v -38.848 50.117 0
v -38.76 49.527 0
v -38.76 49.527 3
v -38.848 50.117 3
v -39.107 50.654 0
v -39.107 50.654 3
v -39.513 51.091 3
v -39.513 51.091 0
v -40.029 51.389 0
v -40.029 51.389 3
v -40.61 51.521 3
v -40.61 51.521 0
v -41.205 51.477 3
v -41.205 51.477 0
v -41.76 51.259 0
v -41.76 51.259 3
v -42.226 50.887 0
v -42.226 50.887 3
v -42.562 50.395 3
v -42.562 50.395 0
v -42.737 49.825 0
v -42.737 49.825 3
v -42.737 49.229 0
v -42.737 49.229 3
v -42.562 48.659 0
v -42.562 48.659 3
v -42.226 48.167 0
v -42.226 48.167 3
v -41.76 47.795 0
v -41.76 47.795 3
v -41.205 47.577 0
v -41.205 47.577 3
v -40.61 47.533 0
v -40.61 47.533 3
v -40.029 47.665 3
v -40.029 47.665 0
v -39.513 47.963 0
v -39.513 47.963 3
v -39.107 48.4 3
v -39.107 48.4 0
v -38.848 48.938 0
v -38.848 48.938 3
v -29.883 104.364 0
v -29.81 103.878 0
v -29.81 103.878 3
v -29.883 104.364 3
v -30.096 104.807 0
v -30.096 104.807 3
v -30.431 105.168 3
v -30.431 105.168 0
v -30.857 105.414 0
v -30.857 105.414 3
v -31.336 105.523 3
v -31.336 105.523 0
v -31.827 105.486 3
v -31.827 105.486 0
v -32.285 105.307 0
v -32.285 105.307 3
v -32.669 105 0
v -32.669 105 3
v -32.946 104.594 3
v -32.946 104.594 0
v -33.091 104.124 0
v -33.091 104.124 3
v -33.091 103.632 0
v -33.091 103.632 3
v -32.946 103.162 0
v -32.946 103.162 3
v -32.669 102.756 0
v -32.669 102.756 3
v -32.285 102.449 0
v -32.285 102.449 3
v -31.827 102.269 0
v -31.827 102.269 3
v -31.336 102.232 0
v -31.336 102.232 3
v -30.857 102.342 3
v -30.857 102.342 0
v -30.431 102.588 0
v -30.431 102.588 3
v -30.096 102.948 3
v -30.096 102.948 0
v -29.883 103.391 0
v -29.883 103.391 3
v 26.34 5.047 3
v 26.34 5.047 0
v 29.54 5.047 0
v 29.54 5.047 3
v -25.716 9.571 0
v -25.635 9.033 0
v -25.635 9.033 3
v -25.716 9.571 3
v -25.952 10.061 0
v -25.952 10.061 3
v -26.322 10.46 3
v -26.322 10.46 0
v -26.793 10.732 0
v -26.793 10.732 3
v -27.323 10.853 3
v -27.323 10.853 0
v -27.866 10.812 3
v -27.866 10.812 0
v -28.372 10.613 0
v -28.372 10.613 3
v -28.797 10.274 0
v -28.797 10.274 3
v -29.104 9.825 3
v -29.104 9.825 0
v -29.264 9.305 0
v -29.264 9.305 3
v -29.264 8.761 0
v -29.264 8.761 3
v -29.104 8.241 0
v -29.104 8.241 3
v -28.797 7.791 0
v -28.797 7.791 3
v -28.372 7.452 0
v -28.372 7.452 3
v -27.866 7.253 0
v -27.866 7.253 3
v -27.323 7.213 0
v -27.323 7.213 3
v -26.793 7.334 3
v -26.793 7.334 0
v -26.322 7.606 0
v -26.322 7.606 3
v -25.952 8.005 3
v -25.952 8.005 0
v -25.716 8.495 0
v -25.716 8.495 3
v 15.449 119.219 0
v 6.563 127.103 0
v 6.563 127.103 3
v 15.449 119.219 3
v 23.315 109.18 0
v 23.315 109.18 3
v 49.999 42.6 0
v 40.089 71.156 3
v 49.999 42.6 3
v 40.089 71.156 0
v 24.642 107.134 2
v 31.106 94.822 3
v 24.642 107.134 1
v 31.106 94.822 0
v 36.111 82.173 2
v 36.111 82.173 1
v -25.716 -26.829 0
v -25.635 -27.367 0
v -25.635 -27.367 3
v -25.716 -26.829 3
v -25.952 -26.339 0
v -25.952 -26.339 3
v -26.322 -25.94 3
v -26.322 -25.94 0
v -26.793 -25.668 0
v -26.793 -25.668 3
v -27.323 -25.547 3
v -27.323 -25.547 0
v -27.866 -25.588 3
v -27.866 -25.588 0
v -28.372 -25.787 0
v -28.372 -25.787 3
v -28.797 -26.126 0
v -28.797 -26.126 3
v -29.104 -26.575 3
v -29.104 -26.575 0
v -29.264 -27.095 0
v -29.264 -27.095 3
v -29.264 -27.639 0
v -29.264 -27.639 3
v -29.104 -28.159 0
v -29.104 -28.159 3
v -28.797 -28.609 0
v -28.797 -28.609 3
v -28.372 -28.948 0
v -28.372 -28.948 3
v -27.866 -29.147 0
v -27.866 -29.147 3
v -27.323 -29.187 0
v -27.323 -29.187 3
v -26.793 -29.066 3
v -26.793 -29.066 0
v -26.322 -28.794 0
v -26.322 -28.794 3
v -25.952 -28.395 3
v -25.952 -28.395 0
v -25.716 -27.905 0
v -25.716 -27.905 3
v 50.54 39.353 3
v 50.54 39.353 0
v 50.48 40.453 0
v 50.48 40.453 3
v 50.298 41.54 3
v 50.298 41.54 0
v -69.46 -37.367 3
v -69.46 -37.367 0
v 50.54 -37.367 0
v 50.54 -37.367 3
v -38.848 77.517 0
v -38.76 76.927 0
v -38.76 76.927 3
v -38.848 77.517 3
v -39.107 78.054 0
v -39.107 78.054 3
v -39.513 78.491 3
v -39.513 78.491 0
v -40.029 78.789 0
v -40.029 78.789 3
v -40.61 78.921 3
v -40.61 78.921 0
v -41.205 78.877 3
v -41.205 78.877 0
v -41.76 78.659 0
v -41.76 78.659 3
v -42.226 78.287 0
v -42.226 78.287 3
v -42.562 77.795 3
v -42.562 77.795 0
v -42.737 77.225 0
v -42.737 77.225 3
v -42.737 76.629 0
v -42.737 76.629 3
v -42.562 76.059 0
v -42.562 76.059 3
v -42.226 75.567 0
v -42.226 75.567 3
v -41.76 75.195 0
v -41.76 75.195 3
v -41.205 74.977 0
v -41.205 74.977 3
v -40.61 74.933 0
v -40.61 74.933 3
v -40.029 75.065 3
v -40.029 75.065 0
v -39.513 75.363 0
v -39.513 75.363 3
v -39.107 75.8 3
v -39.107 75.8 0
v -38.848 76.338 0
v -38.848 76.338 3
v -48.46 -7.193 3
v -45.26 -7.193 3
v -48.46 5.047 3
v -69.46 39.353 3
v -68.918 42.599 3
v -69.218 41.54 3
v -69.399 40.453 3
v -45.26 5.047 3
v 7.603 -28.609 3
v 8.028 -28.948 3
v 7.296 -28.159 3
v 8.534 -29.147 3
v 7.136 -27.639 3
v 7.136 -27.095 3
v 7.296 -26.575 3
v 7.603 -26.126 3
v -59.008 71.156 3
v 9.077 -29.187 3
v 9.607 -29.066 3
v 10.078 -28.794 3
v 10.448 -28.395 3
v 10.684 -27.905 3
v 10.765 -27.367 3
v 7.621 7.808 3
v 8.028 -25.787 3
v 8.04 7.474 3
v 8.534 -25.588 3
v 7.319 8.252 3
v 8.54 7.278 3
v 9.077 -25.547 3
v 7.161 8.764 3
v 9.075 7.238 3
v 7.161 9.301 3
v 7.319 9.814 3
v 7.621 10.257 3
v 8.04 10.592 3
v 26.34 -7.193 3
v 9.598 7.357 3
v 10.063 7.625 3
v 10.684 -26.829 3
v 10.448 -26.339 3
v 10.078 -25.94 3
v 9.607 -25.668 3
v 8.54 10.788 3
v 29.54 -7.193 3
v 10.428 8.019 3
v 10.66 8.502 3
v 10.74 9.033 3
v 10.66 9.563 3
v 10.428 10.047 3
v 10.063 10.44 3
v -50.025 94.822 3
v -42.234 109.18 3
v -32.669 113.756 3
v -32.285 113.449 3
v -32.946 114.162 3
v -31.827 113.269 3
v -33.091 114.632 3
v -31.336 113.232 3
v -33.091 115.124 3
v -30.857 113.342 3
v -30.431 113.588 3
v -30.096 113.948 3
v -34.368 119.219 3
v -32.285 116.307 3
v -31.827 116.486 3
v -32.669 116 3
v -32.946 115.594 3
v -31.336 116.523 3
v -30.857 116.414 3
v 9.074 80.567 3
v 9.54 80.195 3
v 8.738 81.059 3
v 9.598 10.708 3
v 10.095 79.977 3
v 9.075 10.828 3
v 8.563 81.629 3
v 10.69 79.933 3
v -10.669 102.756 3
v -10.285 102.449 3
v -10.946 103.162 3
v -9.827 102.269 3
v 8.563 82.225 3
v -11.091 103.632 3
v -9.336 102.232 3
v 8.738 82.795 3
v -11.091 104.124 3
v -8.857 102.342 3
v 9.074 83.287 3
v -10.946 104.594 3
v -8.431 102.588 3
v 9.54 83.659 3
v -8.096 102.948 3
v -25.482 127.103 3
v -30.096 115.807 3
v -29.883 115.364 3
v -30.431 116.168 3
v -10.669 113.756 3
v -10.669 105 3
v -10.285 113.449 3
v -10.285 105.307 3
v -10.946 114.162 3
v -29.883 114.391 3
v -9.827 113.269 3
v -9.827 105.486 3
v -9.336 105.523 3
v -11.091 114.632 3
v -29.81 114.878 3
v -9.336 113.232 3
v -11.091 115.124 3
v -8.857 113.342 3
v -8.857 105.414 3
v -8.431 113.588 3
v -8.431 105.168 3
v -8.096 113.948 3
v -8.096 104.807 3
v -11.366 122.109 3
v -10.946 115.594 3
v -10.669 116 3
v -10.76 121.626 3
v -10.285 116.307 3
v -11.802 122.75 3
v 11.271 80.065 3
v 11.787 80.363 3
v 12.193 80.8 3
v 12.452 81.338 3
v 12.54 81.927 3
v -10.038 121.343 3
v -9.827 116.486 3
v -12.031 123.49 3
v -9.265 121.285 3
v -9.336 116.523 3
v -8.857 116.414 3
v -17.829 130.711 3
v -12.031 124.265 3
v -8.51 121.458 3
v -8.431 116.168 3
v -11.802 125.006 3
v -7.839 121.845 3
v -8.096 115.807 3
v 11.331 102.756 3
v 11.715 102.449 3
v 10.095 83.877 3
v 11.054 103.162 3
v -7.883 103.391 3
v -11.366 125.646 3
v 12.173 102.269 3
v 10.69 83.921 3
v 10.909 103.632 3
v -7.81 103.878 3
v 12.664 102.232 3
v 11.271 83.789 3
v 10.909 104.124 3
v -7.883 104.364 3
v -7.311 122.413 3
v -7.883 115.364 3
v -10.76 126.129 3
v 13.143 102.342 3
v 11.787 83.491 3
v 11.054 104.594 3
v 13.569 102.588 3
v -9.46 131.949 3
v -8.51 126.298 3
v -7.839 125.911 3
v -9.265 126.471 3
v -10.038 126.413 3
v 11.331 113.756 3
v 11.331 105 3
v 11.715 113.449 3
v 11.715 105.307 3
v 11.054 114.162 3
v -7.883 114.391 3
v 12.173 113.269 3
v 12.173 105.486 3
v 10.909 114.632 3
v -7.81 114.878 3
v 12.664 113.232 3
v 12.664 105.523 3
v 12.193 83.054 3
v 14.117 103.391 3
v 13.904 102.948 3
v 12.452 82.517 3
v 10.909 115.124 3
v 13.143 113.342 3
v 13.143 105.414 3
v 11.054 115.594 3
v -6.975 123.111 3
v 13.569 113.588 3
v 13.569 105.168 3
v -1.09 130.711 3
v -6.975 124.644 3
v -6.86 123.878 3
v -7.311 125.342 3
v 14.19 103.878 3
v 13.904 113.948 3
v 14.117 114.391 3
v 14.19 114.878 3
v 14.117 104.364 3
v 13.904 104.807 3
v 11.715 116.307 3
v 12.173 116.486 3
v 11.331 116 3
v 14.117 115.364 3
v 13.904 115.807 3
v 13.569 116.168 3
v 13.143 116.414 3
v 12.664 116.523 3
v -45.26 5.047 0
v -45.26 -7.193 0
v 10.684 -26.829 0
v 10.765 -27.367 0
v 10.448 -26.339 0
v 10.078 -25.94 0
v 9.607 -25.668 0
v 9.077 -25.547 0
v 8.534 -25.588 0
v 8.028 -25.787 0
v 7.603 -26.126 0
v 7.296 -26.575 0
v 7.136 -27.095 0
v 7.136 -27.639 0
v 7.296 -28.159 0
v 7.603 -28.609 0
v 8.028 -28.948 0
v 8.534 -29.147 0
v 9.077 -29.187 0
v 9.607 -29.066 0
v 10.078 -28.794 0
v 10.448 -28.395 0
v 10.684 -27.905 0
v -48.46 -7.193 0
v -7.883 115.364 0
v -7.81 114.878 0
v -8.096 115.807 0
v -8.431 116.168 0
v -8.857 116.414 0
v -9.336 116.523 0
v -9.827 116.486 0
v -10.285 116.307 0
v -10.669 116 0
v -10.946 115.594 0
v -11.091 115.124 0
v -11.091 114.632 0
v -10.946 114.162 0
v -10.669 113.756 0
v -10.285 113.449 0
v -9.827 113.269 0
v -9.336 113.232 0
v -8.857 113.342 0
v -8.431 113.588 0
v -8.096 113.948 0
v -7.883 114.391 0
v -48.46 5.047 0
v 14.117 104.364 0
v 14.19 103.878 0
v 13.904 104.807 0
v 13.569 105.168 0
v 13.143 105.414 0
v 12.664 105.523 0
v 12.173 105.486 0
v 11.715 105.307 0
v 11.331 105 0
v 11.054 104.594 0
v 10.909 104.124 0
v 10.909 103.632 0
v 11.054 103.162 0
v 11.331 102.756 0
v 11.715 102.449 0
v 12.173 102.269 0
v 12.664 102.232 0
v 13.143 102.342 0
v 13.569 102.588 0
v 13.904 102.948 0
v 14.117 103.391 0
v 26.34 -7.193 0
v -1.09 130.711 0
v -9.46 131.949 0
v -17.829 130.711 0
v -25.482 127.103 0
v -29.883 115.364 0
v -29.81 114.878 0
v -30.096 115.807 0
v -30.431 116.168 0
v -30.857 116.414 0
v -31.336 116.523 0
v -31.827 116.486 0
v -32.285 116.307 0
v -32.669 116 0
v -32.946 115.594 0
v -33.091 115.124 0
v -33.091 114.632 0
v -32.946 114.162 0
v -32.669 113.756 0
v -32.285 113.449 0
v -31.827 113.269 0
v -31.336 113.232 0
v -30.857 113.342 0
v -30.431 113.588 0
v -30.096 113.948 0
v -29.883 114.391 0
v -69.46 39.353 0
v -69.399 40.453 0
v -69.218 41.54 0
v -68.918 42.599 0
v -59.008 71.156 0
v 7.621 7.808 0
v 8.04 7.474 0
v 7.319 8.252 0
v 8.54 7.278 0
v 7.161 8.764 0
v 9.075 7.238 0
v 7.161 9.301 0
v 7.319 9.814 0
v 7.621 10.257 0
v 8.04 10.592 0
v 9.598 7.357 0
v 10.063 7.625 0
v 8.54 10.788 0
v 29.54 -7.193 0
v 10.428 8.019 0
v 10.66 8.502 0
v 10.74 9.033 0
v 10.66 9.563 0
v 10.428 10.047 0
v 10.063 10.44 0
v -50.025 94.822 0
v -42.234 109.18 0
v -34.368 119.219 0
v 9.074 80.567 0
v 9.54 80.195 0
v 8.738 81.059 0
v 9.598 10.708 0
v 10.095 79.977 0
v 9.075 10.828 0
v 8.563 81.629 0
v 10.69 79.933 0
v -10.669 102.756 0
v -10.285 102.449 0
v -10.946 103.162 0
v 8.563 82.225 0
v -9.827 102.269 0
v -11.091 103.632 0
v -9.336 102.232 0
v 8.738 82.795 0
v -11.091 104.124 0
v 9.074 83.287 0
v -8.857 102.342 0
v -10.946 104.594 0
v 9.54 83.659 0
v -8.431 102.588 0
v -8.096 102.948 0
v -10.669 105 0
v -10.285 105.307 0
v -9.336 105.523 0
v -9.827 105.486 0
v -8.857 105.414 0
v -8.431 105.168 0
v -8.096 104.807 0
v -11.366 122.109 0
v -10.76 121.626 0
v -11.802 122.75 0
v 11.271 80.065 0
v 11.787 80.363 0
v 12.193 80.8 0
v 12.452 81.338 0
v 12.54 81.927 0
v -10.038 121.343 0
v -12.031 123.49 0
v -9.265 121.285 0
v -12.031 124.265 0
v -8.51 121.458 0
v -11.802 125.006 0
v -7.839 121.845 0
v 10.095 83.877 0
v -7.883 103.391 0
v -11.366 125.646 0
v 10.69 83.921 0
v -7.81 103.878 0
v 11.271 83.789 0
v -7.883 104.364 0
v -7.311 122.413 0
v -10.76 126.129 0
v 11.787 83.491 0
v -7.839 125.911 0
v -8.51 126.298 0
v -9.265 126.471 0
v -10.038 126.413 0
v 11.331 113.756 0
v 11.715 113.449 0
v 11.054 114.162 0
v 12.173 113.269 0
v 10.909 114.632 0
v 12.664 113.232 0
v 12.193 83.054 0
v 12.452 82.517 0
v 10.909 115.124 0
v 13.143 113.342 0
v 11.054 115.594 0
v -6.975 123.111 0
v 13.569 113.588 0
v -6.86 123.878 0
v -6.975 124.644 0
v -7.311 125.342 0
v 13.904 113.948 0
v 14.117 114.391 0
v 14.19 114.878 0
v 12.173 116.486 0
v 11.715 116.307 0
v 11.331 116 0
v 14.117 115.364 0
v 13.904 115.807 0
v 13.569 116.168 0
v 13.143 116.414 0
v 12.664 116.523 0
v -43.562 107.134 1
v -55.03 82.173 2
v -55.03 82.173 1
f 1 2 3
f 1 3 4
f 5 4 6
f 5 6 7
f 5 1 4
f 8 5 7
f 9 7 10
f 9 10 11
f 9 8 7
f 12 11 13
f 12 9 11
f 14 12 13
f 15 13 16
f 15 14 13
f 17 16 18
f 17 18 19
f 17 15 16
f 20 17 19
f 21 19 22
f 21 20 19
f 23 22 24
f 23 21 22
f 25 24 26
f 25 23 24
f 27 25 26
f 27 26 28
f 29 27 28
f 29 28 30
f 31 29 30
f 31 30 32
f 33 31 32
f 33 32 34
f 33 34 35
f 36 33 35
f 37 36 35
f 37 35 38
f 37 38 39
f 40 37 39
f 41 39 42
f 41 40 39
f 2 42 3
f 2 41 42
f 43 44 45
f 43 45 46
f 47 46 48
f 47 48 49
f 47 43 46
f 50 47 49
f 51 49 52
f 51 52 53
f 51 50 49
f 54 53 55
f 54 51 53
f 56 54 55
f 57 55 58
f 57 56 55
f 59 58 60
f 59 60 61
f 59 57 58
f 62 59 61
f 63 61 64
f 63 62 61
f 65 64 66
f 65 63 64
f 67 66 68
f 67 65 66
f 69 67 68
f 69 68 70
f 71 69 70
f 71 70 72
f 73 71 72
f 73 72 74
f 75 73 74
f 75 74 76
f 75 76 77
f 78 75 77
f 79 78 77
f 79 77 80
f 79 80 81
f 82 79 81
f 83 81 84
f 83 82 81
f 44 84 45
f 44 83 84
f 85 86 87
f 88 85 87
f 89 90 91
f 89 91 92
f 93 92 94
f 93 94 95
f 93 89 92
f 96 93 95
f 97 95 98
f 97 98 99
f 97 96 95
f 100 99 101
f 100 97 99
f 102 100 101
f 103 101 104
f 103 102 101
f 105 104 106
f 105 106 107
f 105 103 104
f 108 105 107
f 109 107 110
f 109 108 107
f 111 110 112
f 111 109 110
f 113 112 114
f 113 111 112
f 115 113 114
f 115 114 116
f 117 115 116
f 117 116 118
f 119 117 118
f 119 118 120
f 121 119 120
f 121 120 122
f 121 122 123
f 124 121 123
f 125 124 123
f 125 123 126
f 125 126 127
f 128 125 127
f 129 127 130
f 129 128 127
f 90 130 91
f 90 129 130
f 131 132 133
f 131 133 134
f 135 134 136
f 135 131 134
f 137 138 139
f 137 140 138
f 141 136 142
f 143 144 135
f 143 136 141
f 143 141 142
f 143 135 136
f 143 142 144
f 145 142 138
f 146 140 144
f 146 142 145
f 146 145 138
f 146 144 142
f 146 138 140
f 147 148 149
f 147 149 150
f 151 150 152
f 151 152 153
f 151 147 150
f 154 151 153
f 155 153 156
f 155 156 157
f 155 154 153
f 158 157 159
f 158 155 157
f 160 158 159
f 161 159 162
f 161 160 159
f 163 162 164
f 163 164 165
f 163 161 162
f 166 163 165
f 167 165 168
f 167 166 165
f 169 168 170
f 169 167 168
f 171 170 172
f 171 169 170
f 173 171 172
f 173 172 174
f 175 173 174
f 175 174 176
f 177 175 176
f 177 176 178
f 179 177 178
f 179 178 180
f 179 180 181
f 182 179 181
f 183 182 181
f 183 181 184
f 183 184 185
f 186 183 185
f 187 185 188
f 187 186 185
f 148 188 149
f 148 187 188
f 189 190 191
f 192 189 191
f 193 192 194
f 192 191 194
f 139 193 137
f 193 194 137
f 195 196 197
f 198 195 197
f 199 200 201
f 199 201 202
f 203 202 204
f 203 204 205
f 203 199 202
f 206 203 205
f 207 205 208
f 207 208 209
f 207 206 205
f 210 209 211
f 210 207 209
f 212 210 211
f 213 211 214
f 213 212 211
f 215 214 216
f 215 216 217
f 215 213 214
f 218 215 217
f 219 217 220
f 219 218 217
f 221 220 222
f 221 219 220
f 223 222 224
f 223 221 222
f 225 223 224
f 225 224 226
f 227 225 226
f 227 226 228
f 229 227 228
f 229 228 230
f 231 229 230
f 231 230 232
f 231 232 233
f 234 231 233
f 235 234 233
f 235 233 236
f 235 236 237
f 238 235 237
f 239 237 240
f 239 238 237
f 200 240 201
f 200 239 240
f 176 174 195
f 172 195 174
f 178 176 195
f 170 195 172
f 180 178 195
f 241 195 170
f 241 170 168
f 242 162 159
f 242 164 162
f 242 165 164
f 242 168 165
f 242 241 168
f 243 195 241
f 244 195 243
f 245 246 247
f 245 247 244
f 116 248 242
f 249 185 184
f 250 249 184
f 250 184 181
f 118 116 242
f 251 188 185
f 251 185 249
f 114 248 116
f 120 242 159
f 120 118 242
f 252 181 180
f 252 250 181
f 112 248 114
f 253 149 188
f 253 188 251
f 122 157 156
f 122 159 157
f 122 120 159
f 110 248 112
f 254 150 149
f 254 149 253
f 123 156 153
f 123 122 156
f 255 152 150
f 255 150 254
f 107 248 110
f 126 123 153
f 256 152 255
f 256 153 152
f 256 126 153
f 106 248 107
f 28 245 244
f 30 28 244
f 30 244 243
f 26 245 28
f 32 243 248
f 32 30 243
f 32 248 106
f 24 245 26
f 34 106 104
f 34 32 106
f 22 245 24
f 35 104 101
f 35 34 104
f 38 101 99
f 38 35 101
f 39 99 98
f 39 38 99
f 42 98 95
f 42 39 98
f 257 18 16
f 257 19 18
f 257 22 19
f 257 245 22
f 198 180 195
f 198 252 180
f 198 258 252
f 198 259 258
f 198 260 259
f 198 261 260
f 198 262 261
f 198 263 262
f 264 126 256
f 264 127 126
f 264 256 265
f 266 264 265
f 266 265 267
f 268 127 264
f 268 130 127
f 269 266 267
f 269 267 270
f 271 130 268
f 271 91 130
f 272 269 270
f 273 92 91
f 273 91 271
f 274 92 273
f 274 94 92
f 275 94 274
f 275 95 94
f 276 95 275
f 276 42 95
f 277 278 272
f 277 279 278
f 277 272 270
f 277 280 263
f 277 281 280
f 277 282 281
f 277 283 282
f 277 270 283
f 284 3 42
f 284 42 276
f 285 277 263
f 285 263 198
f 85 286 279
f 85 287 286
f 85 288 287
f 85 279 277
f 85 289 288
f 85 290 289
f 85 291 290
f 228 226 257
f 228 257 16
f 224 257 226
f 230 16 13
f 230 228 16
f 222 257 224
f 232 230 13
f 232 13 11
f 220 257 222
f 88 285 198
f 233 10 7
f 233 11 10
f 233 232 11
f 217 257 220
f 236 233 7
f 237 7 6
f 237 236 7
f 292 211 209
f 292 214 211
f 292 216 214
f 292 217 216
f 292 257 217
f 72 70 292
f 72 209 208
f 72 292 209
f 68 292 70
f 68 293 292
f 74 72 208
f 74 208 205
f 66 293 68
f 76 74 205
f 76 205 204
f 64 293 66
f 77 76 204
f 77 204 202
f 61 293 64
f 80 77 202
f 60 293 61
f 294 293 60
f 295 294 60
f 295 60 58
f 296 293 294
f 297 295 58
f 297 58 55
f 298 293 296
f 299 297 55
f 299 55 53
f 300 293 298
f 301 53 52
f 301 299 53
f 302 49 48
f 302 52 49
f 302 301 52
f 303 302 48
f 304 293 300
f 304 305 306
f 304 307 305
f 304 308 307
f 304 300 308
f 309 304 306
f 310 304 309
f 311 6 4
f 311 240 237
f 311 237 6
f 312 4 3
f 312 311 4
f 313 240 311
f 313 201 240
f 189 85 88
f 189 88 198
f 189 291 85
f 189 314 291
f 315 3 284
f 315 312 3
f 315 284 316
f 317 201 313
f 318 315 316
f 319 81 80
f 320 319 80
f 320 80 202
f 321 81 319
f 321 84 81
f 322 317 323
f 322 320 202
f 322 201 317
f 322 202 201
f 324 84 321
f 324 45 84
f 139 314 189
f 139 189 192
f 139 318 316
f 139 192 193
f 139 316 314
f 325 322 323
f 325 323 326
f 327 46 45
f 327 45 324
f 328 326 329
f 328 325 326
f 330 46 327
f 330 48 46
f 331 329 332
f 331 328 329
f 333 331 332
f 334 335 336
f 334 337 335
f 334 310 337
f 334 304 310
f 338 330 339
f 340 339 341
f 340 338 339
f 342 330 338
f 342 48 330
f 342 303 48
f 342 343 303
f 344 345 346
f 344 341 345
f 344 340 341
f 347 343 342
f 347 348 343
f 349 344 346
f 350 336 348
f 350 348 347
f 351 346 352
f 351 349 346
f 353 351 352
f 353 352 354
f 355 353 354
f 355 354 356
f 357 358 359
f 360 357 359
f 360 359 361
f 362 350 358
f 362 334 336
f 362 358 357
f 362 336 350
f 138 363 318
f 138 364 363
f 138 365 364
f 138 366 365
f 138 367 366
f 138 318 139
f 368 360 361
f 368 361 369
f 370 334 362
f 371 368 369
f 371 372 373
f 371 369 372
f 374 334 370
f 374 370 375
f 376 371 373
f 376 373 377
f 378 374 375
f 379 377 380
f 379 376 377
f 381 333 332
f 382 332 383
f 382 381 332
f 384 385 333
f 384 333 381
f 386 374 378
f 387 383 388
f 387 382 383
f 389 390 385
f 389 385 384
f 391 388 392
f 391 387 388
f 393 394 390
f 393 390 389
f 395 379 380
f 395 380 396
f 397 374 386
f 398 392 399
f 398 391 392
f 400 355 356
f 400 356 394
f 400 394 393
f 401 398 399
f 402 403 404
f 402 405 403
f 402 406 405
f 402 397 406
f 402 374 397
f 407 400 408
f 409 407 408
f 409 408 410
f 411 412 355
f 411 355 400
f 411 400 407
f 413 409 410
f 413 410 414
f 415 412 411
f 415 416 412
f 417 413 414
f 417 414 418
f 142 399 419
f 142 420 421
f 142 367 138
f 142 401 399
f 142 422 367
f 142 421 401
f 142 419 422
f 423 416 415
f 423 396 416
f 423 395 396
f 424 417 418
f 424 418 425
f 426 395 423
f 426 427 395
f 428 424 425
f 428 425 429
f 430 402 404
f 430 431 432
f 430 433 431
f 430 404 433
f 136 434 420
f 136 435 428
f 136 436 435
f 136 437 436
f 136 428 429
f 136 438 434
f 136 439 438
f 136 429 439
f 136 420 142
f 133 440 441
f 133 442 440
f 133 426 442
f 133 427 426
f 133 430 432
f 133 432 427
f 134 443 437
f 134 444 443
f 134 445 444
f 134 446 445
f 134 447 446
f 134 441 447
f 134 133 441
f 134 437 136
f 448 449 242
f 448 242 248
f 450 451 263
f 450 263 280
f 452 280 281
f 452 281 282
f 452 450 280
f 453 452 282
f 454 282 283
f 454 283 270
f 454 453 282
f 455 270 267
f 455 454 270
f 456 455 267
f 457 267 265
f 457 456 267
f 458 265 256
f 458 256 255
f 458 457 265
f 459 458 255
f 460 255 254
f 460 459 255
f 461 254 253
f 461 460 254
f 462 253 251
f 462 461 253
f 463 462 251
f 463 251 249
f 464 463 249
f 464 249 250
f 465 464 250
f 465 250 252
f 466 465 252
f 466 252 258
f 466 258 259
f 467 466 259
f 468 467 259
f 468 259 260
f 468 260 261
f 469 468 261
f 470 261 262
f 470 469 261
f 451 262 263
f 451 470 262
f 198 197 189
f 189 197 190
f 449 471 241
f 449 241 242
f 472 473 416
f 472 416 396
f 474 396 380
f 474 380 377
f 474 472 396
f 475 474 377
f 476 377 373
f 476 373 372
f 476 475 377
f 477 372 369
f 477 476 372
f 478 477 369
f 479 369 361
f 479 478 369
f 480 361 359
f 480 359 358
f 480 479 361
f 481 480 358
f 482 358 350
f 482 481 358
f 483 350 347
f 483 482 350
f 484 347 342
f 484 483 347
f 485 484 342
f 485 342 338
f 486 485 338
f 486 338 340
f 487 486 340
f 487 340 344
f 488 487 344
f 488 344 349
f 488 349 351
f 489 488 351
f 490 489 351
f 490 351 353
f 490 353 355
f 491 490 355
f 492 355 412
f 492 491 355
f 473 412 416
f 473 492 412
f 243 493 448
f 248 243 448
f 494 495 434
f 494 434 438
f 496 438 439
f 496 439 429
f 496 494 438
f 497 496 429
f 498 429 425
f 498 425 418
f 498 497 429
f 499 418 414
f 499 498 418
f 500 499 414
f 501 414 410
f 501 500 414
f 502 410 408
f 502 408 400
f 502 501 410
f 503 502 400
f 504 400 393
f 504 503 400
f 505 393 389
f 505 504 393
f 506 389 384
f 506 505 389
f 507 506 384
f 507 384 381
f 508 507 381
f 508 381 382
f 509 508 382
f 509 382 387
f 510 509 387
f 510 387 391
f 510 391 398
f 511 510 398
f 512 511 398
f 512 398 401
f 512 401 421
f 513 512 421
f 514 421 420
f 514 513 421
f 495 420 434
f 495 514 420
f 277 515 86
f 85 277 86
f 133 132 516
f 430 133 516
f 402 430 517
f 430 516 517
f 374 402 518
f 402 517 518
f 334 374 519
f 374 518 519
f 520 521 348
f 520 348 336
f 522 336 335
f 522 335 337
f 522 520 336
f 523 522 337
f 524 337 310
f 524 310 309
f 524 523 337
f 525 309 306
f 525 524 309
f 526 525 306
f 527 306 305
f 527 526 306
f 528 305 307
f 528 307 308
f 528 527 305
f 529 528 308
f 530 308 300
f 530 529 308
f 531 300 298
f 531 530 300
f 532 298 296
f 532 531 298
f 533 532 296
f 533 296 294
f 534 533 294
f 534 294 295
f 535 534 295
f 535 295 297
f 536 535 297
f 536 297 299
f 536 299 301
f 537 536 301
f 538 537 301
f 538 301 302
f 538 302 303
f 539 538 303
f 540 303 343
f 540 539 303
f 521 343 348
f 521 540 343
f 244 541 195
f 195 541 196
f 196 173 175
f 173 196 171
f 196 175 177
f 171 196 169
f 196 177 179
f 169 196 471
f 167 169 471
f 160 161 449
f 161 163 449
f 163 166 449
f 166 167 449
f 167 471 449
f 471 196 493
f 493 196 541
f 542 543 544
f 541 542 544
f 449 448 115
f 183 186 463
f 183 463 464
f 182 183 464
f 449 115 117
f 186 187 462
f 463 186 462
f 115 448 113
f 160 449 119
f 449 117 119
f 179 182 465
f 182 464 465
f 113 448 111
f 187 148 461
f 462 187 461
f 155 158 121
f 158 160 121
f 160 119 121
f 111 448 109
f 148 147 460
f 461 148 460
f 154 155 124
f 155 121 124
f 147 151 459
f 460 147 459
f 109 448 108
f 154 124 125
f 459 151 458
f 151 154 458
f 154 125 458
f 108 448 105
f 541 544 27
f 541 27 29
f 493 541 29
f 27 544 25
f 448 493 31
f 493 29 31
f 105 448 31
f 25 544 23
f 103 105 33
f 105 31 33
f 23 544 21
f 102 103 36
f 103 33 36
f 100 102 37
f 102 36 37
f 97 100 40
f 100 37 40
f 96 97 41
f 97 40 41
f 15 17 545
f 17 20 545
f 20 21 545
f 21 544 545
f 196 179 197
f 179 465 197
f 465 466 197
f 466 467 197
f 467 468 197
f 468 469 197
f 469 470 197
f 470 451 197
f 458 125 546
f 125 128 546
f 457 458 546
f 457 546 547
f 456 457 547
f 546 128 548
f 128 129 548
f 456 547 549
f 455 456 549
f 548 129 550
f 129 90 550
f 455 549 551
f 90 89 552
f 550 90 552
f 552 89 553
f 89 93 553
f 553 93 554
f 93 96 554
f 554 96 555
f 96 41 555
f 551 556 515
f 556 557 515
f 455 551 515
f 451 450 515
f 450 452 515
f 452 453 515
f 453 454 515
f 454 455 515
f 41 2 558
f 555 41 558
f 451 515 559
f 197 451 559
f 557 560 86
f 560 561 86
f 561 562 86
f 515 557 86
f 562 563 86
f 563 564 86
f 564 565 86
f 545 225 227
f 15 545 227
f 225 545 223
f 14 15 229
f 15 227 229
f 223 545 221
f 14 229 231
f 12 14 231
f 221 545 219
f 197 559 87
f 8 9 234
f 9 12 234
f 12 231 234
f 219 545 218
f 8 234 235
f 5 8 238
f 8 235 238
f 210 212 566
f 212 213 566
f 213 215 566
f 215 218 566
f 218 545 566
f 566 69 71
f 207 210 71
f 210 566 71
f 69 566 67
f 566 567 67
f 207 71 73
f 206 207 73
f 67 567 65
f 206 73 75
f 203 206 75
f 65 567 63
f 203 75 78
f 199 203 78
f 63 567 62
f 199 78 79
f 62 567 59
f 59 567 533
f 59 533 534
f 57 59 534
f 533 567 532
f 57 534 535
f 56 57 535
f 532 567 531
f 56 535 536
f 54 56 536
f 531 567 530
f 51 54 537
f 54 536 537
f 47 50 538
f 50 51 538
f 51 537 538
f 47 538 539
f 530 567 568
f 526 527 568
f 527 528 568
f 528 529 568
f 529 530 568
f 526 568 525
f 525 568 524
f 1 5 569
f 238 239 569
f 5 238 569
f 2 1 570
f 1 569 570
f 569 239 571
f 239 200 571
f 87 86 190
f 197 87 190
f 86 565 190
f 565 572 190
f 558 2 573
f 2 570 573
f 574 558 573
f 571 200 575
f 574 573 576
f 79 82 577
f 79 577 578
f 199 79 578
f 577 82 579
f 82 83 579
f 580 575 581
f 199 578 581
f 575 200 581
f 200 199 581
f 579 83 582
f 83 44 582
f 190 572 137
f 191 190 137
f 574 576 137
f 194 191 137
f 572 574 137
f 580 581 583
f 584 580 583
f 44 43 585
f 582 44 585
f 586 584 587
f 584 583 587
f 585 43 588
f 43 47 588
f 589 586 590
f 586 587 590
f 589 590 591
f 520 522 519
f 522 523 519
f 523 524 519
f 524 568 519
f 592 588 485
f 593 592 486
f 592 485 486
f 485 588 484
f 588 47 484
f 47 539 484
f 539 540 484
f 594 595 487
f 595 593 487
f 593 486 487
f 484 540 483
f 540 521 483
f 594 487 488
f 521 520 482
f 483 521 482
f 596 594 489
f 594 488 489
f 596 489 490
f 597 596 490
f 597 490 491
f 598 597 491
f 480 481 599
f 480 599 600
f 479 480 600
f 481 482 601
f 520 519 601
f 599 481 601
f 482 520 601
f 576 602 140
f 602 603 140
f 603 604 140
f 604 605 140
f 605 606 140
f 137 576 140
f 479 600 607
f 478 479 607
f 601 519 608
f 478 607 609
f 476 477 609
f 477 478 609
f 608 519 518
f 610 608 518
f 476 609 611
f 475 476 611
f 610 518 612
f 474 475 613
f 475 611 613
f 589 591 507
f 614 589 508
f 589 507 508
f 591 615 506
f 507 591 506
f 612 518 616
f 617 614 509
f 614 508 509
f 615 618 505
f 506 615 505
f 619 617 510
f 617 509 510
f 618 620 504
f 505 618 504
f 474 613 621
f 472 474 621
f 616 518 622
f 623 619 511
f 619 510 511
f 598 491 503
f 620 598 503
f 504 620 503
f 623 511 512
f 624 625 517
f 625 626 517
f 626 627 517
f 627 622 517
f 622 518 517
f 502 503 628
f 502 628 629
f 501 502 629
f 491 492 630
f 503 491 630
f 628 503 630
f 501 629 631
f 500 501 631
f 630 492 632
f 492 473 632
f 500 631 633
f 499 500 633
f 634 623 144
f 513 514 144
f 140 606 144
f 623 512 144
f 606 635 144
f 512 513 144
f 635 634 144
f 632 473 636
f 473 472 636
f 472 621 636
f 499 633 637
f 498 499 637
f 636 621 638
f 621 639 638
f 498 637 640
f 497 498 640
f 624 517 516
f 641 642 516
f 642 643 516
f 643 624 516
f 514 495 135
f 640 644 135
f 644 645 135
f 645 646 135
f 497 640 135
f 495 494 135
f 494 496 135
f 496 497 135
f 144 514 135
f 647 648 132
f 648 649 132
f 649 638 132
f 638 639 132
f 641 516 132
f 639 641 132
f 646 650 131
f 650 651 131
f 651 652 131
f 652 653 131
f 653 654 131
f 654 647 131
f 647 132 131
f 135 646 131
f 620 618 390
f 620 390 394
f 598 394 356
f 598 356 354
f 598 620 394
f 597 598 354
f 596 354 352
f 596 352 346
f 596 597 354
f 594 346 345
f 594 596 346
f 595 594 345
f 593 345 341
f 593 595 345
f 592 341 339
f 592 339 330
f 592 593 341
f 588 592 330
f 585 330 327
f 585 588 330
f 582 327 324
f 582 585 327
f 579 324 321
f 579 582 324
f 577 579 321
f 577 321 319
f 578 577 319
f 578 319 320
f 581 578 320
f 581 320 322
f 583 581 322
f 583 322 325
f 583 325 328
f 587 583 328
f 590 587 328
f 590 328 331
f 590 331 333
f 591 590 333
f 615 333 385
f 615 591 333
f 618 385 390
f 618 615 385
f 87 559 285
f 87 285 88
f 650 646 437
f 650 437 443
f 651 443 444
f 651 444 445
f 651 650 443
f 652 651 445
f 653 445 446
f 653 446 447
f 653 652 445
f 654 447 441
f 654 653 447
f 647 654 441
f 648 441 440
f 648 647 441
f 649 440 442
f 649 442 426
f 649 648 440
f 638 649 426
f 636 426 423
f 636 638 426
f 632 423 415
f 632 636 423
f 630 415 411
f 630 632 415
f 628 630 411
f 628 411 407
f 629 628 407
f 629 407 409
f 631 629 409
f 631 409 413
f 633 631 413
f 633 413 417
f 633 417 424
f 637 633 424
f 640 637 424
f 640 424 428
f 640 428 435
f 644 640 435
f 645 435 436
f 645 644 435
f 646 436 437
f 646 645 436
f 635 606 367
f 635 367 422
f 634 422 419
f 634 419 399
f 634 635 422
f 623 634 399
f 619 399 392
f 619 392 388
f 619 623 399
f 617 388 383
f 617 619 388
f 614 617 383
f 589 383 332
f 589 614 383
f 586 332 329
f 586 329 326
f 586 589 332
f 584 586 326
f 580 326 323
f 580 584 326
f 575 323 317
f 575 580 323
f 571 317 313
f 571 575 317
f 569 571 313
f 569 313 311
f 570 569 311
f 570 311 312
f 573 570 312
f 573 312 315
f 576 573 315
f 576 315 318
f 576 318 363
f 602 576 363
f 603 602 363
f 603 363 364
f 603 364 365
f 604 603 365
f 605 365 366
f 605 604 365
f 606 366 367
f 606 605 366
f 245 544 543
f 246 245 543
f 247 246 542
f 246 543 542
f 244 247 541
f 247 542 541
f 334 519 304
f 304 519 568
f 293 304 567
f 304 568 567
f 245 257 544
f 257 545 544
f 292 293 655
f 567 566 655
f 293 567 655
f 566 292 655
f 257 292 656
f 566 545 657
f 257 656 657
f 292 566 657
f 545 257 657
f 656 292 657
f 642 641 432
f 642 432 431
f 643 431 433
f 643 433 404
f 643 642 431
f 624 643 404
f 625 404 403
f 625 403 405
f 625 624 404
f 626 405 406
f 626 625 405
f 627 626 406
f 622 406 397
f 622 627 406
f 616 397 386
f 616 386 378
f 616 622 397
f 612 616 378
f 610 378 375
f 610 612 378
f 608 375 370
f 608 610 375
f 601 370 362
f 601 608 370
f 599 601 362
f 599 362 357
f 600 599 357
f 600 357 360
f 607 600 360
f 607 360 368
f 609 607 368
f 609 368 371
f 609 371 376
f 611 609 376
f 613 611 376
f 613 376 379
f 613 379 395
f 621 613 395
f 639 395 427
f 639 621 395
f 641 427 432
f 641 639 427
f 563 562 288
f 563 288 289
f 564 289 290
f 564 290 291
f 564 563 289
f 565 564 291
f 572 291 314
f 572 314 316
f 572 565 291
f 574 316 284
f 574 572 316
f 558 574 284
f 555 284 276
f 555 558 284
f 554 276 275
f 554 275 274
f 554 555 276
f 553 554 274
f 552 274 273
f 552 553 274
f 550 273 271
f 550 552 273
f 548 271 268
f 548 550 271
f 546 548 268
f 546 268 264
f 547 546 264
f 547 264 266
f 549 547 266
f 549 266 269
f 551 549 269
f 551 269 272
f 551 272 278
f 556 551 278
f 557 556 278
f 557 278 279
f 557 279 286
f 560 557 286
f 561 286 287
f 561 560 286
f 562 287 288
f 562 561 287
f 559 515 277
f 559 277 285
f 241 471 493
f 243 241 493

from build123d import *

# Parameters (mm, degrees)
F0_W     = 3.2
F0_H     = 12.24
F0_R     = 1.825
F0_R_2   = 2
F0_R_3   = 1.8
F0_R_4   = 1.65
F0_R_5   = 2.6
F1_DEPTH = 3


# Not quite as in the source:
# - ends of sketch curves that miss each other by under 0.0002 mm in the source are joined


with BuildPart() as f1:
    # F0 (on Top) → F1 (new body)
    with BuildSketch(Plane.XY):
        with BuildLine():
            Line((-69.459583357, 39.3533453141), (-69.459583357, -37.3673290014))
            Line((-69.459583357, -37.3673290014), (50.540416643, -37.3673290014))
            Line((50.540416643, -37.3673290014), (50.540416643, 39.3533036827))
            ThreePointArc((50.540416643, 39.3533036827), (50.404091241, 40.9988806108), (49.9988319578, 42.5995907516))
            add(Edge.make_bspline(
                [(6.5631451309, 127.1030604839), (13.1949586637, 122.5735143927), (26.4702997739, 107.0194370927), (36.3799750231, 82.2251008364), (45.1615562759, 56.6935268147), (49.9988319578, 42.5995907516)],
                knots=[0.1966855051, 0.1966855051, 0.1966855051, 0.1966855051, 0.4414351438, 0.6885909138, 0.9887974302, 0.9887974302, 0.9887974302, 0.9887974302], degree=3))
            ThreePointArc((6.5631451309, 127.1030604839), (-9.459583357, 131.9487932431), (-25.4823118448, 127.1030604839))
            add(Edge.make_bspline(
                [(-25.4823118448, 127.1030604839), (-32.1141253777, 122.5735143927), (-45.3894664879, 107.0194370927), (-55.2991588518, 82.2250580149), (-64.0807668858, 56.6933991917), (-68.9180648017, 42.5993980747)],
                knots=[0.1966855051, 0.1966855051, 0.1966855051, 0.1966855051, 0.4414351438, 0.6885909138, 0.9887987982, 0.9887987982, 0.9887987982, 0.9887987982], degree=3))
            ThreePointArc((-68.9180648017, 42.5993980747), (-69.323277955, 40.9988023559), (-69.459583357, 39.3533453141))
        make_face()
        with Locations((-46.859583357, -1.0729111145)):
            Rectangle(F0_W, F0_H, mode=Mode.SUBTRACT)
        with Locations((-27.459583357, -27.3673290014)):
            Circle(F0_R, mode=Mode.SUBTRACT)
        with Locations((-27.459583357, 9.0326709986)):
            Circle(F0_R, mode=Mode.SUBTRACT)
        with Locations((-40.759583357, 49.5270888855)):
            Circle(F0_R_2, mode=Mode.SUBTRACT)
        with Locations((8.940416643, -27.3673290014)):
            Circle(F0_R, mode=Mode.SUBTRACT)
        with Locations((8.940416643, 9.0326709986)):
            Circle(F0_R_3, mode=Mode.SUBTRACT)
        with Locations((27.940416643, -1.0729111145)):
            Rectangle(F0_W, F0_H, mode=Mode.SUBTRACT)
        with Locations((-40.759583357, 76.9270888855)):
            Circle(F0_R_2, mode=Mode.SUBTRACT)
        with Locations((-31.459583357, 103.8777989149)):
            Circle(F0_R_4, mode=Mode.SUBTRACT)
        with Locations((-9.459583357, 103.8777989149)):
            Circle(F0_R_4, mode=Mode.SUBTRACT)
        with Locations((-31.459583357, 114.8777989149)):
            Circle(F0_R_4, mode=Mode.SUBTRACT)
        with Locations((-9.459583357, 114.8777989149)):
            Circle(F0_R_4, mode=Mode.SUBTRACT)
        with Locations((-9.459583357, 123.8777989149)):
            Circle(F0_R_5, mode=Mode.SUBTRACT)
        with Locations((10.540416643, 81.9270888855)):
            Circle(F0_R_2, mode=Mode.SUBTRACT)
        with Locations((12.540416643, 103.8777989149)):
            Circle(F0_R_4, mode=Mode.SUBTRACT)
        with Locations((12.540416643, 114.8777989149)):
            Circle(F0_R_4, mode=Mode.SUBTRACT)
    extrude(amount=F1_DEPTH)


solid = f1.part
